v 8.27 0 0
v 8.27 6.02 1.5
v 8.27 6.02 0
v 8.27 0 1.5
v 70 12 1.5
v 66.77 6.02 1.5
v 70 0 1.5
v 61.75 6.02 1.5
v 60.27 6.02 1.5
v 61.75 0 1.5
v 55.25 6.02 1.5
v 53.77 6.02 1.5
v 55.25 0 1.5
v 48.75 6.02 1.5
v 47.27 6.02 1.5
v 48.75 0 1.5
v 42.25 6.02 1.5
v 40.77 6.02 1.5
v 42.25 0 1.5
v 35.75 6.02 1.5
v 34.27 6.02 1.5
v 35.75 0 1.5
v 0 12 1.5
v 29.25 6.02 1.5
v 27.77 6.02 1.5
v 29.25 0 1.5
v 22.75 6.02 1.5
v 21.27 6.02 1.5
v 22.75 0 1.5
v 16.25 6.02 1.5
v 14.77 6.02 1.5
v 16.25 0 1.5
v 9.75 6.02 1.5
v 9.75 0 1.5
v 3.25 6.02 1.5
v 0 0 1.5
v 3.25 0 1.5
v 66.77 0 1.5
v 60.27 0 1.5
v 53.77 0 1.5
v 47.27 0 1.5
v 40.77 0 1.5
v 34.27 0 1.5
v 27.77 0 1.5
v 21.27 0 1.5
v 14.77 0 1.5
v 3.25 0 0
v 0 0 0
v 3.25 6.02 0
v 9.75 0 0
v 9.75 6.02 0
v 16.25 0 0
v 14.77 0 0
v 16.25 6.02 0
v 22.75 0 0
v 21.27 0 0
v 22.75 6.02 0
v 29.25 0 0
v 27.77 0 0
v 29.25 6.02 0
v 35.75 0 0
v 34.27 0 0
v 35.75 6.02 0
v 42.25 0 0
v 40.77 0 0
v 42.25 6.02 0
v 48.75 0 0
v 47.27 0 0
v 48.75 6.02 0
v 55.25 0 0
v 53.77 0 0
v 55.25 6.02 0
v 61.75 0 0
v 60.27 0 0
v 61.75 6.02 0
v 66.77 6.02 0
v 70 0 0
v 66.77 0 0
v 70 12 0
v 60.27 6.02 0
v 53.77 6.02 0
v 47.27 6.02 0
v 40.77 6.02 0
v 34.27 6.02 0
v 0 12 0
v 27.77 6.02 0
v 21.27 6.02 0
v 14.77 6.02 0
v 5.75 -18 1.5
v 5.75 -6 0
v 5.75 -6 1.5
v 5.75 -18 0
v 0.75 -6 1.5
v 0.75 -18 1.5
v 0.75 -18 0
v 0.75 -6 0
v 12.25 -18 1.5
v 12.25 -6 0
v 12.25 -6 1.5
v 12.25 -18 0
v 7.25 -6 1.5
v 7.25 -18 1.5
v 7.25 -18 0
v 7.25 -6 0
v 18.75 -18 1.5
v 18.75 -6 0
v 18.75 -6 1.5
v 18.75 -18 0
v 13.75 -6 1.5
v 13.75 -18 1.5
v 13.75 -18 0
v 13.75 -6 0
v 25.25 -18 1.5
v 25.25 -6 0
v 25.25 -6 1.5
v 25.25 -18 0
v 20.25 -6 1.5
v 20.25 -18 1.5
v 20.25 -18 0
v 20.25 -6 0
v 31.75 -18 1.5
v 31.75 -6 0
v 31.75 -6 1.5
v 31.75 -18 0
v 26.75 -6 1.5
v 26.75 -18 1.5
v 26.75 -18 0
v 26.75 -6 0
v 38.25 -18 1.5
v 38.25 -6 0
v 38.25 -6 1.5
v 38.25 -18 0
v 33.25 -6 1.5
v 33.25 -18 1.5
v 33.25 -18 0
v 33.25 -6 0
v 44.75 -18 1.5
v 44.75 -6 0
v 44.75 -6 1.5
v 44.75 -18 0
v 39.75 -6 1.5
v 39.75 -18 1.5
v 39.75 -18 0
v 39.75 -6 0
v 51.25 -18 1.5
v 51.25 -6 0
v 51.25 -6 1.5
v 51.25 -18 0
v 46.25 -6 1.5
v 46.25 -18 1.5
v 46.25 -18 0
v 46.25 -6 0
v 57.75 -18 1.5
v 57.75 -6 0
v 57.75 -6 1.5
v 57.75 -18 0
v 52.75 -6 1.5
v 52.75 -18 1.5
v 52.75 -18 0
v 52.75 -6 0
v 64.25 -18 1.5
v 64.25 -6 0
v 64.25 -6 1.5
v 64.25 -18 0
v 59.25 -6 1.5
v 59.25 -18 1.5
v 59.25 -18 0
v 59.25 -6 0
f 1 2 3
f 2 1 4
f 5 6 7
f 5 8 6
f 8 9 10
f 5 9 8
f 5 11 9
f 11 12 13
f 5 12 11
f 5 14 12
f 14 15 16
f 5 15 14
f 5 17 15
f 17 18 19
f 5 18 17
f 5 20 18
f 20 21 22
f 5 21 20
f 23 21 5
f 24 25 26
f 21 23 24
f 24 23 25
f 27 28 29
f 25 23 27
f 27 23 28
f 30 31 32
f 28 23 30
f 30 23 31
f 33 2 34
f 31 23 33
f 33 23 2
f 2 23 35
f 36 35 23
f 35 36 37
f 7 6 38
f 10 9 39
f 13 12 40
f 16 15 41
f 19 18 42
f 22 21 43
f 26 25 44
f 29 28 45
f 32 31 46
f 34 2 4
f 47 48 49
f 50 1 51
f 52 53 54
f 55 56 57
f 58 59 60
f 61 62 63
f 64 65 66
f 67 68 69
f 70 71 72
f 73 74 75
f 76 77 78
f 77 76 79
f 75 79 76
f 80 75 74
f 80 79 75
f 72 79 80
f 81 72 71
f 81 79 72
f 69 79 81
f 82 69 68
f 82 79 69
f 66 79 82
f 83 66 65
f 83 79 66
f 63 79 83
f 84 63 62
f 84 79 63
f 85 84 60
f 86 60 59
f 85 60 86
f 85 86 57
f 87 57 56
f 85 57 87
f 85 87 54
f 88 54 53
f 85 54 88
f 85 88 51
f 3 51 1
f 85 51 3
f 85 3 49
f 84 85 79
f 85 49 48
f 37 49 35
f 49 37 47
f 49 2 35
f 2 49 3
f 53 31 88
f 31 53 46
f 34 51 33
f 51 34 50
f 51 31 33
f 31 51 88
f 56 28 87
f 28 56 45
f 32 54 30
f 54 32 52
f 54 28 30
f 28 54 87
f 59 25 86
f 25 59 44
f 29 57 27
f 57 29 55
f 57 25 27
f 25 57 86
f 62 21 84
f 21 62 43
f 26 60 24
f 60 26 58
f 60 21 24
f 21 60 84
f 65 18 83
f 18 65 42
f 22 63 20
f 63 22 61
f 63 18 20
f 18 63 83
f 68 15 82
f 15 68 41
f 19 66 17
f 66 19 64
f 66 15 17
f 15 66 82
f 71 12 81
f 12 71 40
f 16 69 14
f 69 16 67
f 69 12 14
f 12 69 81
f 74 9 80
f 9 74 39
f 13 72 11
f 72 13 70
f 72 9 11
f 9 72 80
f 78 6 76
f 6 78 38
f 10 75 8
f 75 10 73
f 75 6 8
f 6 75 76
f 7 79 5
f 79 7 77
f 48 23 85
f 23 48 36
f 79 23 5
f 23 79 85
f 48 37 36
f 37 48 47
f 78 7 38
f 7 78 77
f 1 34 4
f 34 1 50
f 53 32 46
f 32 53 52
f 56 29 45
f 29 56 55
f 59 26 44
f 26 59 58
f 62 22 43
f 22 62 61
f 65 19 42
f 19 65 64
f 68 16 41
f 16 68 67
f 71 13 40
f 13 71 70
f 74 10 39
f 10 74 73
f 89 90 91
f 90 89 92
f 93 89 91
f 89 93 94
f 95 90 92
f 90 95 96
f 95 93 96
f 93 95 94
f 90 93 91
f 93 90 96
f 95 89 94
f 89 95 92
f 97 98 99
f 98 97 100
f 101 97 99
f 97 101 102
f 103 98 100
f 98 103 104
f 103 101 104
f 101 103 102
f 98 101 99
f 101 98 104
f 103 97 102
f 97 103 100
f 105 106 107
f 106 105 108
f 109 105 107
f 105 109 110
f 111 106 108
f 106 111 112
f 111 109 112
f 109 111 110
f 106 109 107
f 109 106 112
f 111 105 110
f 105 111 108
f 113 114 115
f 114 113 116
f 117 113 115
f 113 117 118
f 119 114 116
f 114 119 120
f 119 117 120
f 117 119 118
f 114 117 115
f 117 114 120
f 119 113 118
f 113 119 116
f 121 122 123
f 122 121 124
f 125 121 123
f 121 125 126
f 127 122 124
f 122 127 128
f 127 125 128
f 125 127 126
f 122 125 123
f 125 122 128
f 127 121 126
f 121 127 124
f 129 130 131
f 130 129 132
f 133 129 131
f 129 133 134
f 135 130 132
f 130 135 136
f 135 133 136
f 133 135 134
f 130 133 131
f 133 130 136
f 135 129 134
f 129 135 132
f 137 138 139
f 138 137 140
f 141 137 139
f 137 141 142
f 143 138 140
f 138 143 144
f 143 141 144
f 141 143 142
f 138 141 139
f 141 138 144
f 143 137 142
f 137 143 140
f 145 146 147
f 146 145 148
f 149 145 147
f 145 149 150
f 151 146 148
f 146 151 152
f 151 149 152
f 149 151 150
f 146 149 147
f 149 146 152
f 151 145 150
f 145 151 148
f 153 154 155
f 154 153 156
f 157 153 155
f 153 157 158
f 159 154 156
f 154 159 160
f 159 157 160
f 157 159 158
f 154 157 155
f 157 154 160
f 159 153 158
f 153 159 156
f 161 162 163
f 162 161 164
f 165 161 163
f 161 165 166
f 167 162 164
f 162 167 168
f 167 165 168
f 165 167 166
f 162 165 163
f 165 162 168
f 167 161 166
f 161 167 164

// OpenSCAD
// 10-well Agarose Gel Comb
// Designed for FDM printing, lying flat on the XY plane (Z=0).
// Dimensions in millimetres.

$fn = 100; // High resolution for smooth edges

// --- Dimensions ---
SPINE_LENGTH = 70;  // X
SPINE_WIDTH = 12;   // Y
PLATE_THICKNESS = 1.5; // Z

TOOTH_WIDTH = 5.0;  // X
TOOTH_LENGTH = 12;  // Y (extends from spine edge)
NUM_TEETH = 10;
GAP_SIZE = 1.5;     // Gap between teeth

// --- Calculations ---
// Total width of the tooth row
TOOTH_ROW_WIDTH = (NUM_TEETH * TOOTH_WIDTH) + ((NUM_TEETH - 1) * GAP_SIZE);

// Offset to center the tooth row on the spine in X
X_OFFSET = (SPINE_LENGTH - TOOTH_ROW_WIDTH) / 2;

// Spine geometry: Centered at (0,0) in XY.
// Spine Y range: -SPINE_WIDTH/2 to +SPINE_WIDTH/2
// Spine Edge (where teeth hang): Y = -SPINE_WIDTH/2
SPINE_EDGE_Y = -SPINE_WIDTH / 2;

// Tooth Y range: Starts at SPINE_EDGE_Y, extends TOOTH_LENGTH in -Y direction.
// Tooth Center Y = SPINE_EDGE_Y - (TOOTH_LENGTH / 2)
TOOTH_CENTER_Y = SPINE_EDGE_Y - (TOOTH_LENGTH / 2);

// --- Main Body Construction ---
// We build the spine and teeth in one union to ensure they are a single solid.
// Strategy: Create the full spine block, then cut out the tooth slots, 
// then add the teeth back as solid blocks.

difference() {
    // 1. The Main Spine Block
    // Positioned at Z=0, centered in X and Y.
    translate([0, 0, 0]) {
        cube([SPINE_LENGTH, SPINE_WIDTH, PLATE_THICKNESS], center = false);
    }
    
    // 2. Cut out slots for the teeth
    // We cut a rectangle for each tooth slot.
    // The slot extends from the spine edge (SPINE_EDGE_Y) downwards by TOOTH_LENGTH.
    // The slot width is TOOTH_WIDTH.
    // We extend the cut slightly (0.01mm) to ensure clean separation.
    
    for (i = [0 : NUM_TEETH - 1]) {
        // Calculate X position for this tooth
        tooth_x = X_OFFSET + (i * (TOOTH_WIDTH + GAP_SIZE));
        
        // Calculate Y position for the slot
        // The slot spans from SPINE_EDGE_Y down to SPINE_EDGE_Y - TOOTH_LENGTH
        translate([tooth_x, SPINE_EDGE_Y, 0]) {
            // Cut a rectangle slightly larger than the tooth to ensure separation
            cube([TOOTH_WIDTH + 0.02, TOOTH_LENGTH + 0.02, PLATE_THICKNESS], center = false);
        }
    }
}

// --- Add Teeth ---
// Now we add the solid teeth back.
// They sit on the bed (Z=0) and go up to PLATE_THICKNESS.
// They hang from the spine edge.

union() {
    for (i = [0 : NUM_TEETH - 1]) {
        tooth_x = X_OFFSET + (i * (TOOTH_WIDTH + GAP_SIZE));
        
        // Position the tooth
        // X: tooth_x
        // Y: tooth_x is center. Y center is TOOTH_CENTER_Y.
        // Z: Centered at PLATE_THICKNESS/2
        
        translate([tooth_x, TOOTH_CENTER_Y, PLATE_THICKNESS / 2]) {
            cube([TOOTH_WIDTH, TOOTH_LENGTH, PLATE_THICKNESS], center = true);
        }
    }
}
